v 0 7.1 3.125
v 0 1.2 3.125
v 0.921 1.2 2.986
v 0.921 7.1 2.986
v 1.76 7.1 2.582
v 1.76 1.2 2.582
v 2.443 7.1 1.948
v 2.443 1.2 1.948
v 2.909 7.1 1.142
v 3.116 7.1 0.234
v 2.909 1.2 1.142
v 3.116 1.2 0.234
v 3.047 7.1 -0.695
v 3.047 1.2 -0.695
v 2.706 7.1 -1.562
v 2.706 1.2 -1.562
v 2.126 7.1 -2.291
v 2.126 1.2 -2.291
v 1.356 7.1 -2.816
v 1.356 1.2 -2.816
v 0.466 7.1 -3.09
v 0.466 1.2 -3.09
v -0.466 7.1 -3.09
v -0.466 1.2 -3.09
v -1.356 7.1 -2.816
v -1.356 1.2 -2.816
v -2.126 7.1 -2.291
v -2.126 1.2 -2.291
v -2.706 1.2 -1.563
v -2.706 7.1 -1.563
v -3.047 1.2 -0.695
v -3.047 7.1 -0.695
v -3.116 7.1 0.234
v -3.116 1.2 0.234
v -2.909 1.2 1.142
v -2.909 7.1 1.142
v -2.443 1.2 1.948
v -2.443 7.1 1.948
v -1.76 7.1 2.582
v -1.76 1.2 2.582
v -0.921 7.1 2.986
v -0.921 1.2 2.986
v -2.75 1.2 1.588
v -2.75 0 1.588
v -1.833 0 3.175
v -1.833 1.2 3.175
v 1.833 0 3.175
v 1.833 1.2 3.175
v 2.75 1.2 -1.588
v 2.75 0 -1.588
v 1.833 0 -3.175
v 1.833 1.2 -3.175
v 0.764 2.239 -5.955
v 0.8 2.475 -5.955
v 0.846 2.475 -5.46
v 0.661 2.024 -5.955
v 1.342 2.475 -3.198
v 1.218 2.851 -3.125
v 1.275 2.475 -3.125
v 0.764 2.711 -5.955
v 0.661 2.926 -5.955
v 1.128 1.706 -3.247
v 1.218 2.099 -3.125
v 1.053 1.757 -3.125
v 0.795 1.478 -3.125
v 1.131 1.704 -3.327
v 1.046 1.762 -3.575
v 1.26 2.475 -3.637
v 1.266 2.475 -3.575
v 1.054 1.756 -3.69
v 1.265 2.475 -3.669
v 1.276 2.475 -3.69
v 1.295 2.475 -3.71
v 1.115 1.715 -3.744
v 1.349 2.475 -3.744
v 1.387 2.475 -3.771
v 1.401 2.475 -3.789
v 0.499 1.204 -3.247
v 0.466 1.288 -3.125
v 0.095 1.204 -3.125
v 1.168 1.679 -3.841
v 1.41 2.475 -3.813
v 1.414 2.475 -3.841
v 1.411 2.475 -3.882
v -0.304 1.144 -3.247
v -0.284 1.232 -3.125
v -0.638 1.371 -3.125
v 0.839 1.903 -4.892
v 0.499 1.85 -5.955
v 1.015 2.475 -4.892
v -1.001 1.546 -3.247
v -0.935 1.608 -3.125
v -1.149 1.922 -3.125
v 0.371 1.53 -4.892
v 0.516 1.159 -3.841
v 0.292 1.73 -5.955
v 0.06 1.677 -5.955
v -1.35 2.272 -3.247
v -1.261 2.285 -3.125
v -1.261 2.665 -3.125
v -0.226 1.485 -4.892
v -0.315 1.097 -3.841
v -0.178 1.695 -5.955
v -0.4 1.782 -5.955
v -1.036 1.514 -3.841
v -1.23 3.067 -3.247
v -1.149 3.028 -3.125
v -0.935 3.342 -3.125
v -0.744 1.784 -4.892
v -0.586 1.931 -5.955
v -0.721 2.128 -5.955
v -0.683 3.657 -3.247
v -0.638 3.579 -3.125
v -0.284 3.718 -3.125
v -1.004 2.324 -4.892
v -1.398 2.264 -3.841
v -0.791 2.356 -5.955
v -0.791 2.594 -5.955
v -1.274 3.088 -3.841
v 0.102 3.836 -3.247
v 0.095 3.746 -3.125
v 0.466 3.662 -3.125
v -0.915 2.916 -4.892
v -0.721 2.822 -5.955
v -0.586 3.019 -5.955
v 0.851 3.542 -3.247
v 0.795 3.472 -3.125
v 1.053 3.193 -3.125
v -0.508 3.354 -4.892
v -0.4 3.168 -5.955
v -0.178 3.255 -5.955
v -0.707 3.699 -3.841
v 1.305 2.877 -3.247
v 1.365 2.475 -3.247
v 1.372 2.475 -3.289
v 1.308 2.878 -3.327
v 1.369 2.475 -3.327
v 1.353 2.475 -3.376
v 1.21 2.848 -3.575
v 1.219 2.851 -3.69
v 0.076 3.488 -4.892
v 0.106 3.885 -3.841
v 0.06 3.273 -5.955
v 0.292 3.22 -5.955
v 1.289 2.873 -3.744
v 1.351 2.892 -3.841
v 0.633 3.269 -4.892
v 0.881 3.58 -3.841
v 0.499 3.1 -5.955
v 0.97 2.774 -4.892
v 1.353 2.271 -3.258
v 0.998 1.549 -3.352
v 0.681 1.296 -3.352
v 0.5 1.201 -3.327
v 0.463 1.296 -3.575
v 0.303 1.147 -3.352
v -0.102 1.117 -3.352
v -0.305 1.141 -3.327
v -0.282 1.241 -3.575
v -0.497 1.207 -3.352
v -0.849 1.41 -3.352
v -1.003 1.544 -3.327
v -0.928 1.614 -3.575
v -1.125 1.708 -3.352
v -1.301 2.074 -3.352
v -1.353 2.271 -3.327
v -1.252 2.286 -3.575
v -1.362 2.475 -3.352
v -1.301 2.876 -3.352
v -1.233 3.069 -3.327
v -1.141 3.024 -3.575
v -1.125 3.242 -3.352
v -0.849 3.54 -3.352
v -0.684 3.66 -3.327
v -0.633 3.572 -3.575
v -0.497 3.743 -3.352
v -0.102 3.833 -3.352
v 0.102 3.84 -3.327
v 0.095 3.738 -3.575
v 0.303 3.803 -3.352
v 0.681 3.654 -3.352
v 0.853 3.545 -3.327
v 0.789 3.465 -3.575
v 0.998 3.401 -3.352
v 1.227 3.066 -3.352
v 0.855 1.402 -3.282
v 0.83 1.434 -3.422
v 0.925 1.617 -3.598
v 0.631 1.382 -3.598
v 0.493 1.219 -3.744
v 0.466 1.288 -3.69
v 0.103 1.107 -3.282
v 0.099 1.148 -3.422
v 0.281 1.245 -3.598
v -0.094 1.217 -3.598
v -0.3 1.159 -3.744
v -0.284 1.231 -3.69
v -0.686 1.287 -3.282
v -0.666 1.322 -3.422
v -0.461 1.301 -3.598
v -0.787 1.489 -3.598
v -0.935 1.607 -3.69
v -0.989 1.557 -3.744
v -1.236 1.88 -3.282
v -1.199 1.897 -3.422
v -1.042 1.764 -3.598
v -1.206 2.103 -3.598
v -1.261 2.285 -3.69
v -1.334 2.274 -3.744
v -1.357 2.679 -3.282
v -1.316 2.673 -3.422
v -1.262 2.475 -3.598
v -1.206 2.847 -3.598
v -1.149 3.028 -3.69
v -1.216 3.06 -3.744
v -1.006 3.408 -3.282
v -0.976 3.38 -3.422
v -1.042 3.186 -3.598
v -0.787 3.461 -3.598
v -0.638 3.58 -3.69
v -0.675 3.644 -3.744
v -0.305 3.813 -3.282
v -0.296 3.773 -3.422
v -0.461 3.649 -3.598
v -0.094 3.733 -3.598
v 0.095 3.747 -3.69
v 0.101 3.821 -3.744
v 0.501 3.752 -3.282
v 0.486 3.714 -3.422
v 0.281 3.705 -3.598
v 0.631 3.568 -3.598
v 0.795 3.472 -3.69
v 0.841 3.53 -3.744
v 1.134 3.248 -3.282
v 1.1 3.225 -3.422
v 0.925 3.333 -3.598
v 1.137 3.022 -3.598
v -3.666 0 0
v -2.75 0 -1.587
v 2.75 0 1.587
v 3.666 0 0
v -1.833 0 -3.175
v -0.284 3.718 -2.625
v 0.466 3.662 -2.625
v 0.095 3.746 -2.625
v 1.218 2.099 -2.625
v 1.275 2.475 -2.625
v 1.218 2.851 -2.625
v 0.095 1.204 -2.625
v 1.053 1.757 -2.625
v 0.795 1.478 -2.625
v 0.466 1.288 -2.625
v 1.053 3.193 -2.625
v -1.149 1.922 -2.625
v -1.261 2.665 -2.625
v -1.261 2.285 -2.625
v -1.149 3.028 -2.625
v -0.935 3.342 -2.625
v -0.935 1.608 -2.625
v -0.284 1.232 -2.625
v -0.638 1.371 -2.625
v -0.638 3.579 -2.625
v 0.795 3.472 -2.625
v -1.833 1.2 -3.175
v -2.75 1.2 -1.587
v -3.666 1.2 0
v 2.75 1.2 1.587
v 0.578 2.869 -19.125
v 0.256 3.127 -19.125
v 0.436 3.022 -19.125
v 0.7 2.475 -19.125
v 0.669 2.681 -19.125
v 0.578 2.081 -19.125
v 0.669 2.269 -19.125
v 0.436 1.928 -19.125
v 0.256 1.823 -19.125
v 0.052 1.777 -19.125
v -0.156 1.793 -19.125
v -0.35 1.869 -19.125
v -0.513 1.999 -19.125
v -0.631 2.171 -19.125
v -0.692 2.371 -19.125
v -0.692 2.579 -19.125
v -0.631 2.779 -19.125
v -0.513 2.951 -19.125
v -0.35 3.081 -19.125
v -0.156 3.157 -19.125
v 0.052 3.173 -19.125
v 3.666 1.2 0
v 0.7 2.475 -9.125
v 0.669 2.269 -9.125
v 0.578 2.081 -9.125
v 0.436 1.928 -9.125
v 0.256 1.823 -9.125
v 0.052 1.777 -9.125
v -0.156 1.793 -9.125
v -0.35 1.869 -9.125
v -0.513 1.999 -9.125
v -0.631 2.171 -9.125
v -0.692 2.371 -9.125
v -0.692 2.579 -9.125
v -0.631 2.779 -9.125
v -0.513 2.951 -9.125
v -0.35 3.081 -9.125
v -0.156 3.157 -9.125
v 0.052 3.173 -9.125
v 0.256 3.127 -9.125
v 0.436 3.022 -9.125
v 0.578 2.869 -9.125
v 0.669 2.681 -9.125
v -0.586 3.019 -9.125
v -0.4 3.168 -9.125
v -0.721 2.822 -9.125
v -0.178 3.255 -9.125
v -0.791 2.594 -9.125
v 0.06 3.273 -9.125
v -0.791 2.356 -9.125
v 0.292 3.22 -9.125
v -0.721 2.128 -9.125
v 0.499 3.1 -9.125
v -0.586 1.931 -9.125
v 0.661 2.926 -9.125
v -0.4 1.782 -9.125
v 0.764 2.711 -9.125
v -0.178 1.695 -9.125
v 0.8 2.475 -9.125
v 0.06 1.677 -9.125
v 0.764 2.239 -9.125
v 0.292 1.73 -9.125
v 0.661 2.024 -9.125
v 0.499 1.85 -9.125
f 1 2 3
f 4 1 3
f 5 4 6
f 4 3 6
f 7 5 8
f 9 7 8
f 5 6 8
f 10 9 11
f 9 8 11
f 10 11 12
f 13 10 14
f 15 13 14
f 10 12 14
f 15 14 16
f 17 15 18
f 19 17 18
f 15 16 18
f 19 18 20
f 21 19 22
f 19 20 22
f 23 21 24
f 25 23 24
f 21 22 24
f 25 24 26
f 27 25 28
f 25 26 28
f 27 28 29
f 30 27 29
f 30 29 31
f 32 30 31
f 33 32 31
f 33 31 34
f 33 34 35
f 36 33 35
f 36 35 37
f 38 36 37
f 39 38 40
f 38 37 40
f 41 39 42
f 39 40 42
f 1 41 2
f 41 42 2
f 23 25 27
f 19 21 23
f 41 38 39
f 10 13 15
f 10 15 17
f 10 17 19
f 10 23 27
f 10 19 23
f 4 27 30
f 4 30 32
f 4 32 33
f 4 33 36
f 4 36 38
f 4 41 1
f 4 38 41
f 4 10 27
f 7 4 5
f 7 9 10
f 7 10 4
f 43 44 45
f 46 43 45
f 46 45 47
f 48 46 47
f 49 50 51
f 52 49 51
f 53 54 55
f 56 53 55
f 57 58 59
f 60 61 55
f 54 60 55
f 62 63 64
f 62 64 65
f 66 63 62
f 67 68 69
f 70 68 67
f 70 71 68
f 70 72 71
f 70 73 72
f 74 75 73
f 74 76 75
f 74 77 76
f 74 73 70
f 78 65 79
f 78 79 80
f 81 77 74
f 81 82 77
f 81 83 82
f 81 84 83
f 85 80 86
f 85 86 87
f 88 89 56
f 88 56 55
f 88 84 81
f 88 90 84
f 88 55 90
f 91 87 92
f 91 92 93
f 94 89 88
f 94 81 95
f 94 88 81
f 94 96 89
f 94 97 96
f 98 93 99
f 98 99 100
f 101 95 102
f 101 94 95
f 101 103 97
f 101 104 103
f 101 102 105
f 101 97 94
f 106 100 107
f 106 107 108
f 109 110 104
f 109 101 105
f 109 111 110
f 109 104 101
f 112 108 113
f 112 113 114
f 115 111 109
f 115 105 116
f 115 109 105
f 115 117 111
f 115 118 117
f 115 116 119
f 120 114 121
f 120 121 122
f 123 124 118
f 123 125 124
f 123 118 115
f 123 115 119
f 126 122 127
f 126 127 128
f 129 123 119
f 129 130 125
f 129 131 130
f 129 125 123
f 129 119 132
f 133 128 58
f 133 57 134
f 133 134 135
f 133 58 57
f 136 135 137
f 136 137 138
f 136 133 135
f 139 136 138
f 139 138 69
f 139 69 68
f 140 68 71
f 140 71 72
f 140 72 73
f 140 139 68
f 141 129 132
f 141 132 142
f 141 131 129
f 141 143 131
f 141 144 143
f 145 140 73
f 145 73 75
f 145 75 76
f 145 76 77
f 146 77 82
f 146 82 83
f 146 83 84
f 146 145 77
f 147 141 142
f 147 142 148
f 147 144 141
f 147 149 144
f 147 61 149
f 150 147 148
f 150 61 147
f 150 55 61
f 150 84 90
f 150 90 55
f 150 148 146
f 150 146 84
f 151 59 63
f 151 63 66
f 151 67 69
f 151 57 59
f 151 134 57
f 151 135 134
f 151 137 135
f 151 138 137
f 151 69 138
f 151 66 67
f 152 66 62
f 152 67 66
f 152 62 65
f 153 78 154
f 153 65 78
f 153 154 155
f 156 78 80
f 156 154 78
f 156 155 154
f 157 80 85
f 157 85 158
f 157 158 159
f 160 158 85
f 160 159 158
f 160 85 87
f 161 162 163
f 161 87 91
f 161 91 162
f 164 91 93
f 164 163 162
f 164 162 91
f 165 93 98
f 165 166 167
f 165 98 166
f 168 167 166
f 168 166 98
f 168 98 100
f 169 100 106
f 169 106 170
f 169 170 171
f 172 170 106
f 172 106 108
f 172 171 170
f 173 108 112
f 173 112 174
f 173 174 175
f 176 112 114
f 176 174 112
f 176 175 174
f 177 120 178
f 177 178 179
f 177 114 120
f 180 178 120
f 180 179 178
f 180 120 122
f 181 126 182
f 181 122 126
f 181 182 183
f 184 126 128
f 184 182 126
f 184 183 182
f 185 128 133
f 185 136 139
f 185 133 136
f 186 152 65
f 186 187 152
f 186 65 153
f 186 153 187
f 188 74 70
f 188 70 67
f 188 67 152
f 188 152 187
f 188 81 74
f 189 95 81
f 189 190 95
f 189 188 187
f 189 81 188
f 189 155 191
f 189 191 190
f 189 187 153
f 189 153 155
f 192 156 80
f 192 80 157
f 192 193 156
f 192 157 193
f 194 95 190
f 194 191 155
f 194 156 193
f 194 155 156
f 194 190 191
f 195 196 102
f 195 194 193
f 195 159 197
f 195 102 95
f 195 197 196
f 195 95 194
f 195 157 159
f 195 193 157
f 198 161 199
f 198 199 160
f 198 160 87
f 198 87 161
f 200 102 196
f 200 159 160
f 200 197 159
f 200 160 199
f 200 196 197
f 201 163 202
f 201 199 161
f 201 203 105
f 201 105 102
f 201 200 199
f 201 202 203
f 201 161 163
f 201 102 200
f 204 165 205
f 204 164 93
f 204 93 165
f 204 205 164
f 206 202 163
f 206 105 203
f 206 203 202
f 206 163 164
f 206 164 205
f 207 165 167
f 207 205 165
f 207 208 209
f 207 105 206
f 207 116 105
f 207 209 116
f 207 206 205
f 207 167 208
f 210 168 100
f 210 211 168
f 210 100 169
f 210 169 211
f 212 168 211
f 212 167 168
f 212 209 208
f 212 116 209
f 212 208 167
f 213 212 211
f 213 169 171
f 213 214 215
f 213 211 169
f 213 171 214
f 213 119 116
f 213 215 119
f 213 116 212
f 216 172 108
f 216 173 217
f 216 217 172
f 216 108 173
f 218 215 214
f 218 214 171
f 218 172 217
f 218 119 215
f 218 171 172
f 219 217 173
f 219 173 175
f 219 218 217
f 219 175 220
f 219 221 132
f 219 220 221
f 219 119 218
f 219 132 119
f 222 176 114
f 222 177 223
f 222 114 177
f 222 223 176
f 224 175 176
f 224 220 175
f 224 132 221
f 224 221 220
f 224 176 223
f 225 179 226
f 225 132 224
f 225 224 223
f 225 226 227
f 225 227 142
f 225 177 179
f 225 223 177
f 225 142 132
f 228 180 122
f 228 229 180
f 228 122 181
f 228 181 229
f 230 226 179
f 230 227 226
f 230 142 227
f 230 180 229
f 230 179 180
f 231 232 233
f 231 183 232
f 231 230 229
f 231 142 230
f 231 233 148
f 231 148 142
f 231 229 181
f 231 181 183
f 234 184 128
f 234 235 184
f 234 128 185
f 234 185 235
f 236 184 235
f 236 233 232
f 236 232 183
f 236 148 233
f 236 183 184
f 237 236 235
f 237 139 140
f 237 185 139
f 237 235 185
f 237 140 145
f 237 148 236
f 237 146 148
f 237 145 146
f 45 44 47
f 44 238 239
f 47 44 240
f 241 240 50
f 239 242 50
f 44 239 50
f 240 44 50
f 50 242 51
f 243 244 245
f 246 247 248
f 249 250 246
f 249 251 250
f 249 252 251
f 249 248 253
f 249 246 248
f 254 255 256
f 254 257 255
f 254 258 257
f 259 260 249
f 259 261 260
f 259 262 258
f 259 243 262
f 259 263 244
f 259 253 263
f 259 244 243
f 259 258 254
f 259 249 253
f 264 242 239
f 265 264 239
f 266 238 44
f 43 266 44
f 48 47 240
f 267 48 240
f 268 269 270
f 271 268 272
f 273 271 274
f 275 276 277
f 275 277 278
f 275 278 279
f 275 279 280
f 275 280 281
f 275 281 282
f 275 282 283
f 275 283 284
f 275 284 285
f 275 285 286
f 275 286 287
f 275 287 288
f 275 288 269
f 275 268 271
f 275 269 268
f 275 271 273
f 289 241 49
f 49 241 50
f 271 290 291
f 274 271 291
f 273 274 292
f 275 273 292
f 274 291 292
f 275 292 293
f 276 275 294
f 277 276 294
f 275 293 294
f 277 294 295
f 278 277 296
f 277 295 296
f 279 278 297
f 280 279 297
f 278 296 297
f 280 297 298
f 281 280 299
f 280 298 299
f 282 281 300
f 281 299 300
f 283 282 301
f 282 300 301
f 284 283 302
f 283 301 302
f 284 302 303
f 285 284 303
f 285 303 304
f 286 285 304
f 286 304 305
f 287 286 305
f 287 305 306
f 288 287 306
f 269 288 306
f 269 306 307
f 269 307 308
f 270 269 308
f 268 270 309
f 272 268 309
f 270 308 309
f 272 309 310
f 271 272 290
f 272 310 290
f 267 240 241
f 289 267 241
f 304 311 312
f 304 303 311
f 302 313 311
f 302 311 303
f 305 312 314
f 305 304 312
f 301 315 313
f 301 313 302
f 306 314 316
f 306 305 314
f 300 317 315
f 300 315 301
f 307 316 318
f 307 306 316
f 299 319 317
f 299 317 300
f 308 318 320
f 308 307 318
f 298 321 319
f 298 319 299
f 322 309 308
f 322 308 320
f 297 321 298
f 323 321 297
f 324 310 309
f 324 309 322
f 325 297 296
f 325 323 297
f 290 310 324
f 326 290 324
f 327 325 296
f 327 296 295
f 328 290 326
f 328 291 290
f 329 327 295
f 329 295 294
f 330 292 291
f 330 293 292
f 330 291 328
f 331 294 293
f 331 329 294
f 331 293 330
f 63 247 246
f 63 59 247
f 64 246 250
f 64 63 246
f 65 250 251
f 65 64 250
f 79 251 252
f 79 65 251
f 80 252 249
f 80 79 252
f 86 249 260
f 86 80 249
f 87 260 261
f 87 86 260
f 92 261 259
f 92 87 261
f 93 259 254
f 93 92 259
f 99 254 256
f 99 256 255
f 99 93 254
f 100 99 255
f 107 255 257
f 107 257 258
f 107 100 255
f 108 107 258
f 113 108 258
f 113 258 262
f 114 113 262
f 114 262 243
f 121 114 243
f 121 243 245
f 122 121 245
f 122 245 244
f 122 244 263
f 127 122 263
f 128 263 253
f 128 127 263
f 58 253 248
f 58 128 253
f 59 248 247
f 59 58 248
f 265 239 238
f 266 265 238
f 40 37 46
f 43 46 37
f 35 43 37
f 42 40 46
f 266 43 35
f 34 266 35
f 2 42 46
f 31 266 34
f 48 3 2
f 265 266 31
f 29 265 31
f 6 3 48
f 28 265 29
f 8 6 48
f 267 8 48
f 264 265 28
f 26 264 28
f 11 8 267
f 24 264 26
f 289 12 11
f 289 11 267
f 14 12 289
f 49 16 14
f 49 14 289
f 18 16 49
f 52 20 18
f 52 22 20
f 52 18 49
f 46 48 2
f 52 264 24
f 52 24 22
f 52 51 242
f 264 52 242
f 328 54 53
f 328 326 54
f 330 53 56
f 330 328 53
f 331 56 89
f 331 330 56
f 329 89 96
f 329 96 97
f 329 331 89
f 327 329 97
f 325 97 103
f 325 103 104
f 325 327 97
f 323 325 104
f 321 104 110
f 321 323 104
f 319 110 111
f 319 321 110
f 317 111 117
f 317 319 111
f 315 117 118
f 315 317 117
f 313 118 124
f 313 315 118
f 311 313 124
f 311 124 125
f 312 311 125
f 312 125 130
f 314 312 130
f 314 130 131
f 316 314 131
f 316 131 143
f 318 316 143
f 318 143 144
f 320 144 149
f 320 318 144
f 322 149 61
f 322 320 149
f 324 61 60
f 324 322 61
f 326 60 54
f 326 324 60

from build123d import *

# Parameters (mm, degrees)
SZKIC1_R                    = 3.175
DODANIE_WYCI_GNI_CIE1_DEPTH = 1.2
SZKIC2_R                    = 3.125
DODANIE_WYCI_GNI_CIE2_DEPTH = 5.9
SZKIC4_R                    = 0.7
DODANIE_WYCI_GNI_CIE3_DEPTH = 10


with BuildPart() as part:
    # Szkic1 → Dodanie-wyciągnięcie1 (new body)
    with BuildSketch(Plane(origin=(0, 0, 0), x_dir=(1, 0, 0), z_dir=(0, 1, 0))):
        Circle(SZKIC1_R)
        with BuildLine():
            ThreePointArc((1.5e-08, -3.175), (-1.587499982, -2.749630667), (-2.749630644, -1.587500022))
            Line((-2.749630644, -1.587500022), (-1.833087105, -3.175))
            Line((-1.833087105, -3.175), (1.5e-08, -3.175))
        make_face()
        with BuildLine():
            ThreePointArc((2.749630678, -1.587499964), (1.587500025, -2.749630643), (1.5e-08, -3.175))
            Line((1.5e-08, -3.175), (1.833087105, -3.175))
            Line((1.833087105, -3.175), (2.749630678, -1.587499964))
        make_face()
        with BuildLine():
            Line((3.666174209, 0), (2.749630648, 1.587500016))
            ThreePointArc((2.749630648, 1.587500016), (3.066814496, 0.821750477), (3.175, 0))
            ThreePointArc((3.175, 0), (3.066814504, -0.821750448), (2.749630678, -1.587499964))
            Line((2.749630678, -1.587499964), (3.666174209, 0))
        make_face()
        with BuildLine():
            ThreePointArc((-2.749630644, -1.587500022), (-3.175, -3.9e-08), (-2.749630684, 1.587499954))
            Line((-2.749630684, 1.587499954), (-3.666174209, 0))
            Line((-3.666174209, 0), (-2.749630644, -1.587500022))
        make_face()
        with BuildLine():
            Line((0, 3.175), (-1.833087105, 3.175))
            Line((-1.833087105, 3.175), (-2.749630684, 1.587499954))
            ThreePointArc((-2.749630684, 1.587499954), (-1.587500023, 2.749630644), (0, 3.175))
        make_face()
        with BuildLine():
            Line((1.833087105, 3.175), (0, 3.175))
            ThreePointArc((0, 3.175), (1.587499992, 2.749630662), (2.749630648, 1.587500016))
            Line((2.749630648, 1.587500016), (1.833087105, 3.175))
        make_face()
    extrude(amount=DODANIE_WYCI_GNI_CIE1_DEPTH)

    # Szkic2 → Dodanie-wyciągnięcie2 (add)
    with BuildSketch(Plane(origin=(0, 1.2, 0), x_dir=(1, 0, 0), z_dir=(0, 1, 0))):
        with Locations(Location((0, 0, 0), (0, 0, 270))):
            Circle(SZKIC2_R)
    extrude(amount=DODANIE_WYCI_GNI_CIE2_DEPTH)


with BuildPart() as body_2:
    # Szkic3 → Obrót6 (revolve)
    with BuildSketch(Plane(origin=(0, 0, 0), x_dir=(0, 0, -1), z_dir=(1, 0, 0)), mode=Mode.PRIVATE) as obr_t6_sk:
        with BuildLine():
            Line((2.625, 1.2), (3.125, 1.2))
            add(Edge.make_bspline(
                [(3.125, 1.2), (3.302341726, 0.994577387), (3.430972676, 1.212802375), (3.71726331, 1.221072779), (3.759645242, 1.037475503), (4.025322746, 1.089812703), (4.67233425, 1.373401445), (5.369312269, 1.691833029), (5.954686582, 1.675)],
                knots=[0, 0, 0, 0, 0.161889297, 0.19827122, 0.247726197, 0.302592126, 0.41924519, 1, 1, 1, 1], degree=3))
            Line((5.954686582, 1.675), (9.125, 1.675))
            Line((9.125, 1.675), (9.125, 2.475))
            Line((9.125, 2.475), (2.625, 2.475))
            Line((2.625, 2.475), (2.625, 1.2))
        make_face()
    revolve(obr_t6_sk.sketch.rotate(Axis((0, 2.475, -2.625), (0, 0, -1)), 270), axis=Axis((0, 2.475, -2.625), (0, 0, -1)))

    # Szkic4 → Dodanie-wyciągnięcie3 (add)
    with BuildSketch(Plane(origin=(0, 0, -9.125), x_dir=(-1, 0, 0), z_dir=(0, 0, -1))):
        with Locations(Location((0, 2.475, 0), (0, 0, 180))):
            Circle(SZKIC4_R)
    extrude(amount=DODANIE_WYCI_GNI_CIE3_DEPTH)


solid = Compound([part.part, body_2.part])
